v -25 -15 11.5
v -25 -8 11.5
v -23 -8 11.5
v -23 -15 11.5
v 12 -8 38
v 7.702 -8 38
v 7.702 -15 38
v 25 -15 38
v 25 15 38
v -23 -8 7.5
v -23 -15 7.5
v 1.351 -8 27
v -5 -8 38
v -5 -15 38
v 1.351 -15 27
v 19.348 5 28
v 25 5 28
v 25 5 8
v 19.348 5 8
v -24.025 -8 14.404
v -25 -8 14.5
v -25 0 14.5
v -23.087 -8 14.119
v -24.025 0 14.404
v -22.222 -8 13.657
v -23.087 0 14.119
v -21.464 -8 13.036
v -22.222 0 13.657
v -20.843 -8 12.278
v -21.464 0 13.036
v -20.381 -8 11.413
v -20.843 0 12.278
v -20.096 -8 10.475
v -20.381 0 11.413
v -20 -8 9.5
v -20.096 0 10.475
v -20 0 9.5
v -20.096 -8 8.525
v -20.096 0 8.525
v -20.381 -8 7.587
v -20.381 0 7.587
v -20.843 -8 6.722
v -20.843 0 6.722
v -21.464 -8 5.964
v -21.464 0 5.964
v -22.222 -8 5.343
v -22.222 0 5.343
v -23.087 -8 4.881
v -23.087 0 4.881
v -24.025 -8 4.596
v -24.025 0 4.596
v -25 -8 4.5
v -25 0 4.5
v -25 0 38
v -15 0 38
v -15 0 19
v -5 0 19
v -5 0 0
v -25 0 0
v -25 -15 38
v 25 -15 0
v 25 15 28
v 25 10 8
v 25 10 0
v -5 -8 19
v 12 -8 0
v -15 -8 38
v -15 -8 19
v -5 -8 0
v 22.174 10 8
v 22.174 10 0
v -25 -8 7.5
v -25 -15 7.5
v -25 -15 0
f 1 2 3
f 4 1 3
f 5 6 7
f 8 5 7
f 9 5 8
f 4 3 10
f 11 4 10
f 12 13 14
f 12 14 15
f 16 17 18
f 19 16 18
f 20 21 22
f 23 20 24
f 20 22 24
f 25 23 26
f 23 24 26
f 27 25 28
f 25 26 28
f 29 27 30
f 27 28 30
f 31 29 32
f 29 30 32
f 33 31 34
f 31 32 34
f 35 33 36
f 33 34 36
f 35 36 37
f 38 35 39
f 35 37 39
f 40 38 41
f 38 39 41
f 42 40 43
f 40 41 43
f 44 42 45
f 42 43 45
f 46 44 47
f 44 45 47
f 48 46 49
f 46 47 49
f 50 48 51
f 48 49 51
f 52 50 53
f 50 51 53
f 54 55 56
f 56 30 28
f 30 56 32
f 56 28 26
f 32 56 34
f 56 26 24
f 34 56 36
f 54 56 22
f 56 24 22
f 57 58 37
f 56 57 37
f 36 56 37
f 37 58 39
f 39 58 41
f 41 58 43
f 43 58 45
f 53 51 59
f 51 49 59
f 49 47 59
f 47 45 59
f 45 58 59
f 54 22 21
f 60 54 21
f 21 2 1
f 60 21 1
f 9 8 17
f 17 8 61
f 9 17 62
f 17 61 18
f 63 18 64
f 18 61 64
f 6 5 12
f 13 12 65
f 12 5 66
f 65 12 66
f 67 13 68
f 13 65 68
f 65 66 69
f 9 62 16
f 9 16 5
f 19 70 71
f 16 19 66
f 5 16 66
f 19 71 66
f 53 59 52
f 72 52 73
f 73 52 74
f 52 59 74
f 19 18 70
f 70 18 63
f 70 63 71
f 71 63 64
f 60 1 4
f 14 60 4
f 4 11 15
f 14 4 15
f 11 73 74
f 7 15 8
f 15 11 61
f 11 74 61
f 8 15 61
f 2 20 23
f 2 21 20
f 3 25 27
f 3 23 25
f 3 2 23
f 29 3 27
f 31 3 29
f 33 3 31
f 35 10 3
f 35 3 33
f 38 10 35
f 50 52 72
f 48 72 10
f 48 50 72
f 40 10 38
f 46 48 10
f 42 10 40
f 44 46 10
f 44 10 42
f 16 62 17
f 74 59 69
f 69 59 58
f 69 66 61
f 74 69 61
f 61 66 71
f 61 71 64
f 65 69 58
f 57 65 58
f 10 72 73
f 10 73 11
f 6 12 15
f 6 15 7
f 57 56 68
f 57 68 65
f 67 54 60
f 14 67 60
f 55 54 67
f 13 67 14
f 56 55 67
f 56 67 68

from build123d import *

# Parameters (mm, degrees)
EXTRUDE_1_DEPTH     = 38
SKETCH_2_R          = 5
SKETCH_2_W          = 10
SKETCH_2_H          = 19
CUT_EXTRUDE_1_DEPTH = 8
SKETCH_3_W          = 4
SKETCH_3_H          = 4
CUT_EXTRUDE_2_DEPTH = 51.970579749
CUT_EXTRUDE_3_DEPTH = 65.567793829


with BuildPart() as part:
    # Эскиз1 → Бобышка-Вытянуть1 (new body)
    with BuildSketch(Plane.XY):
        Polygon((-5, 0), (-25, 0), (-25, -15), (25, -15), (25, 15), (12, -8), (-5, -8), align=None)
    extrude(amount=EXTRUDE_1_DEPTH)

    # Эскиз2 → Вырез-Вытянуть1 (cut)
    with BuildSketch(Plane(origin=(0, 0, 0), x_dir=(1, 0, 0), z_dir=(0, 1, 0))):
        with Locations((-25, -9.5)):
            Circle(SKETCH_2_R)
        with Locations((-10, -28.5)):
            Rectangle(SKETCH_2_W, SKETCH_2_H)
    extrude(amount=-CUT_EXTRUDE_1_DEPTH, mode=Mode.SUBTRACT)

    # Эскиз3 → Вырез-Вытянуть2 (cut, through all)
    with BuildSketch(Plane(origin=(0, -8, 0), x_dir=(1, 0, 0), z_dir=(0, 1, 0))):
        with Locations((-25, -9.5)):
            Rectangle(SKETCH_3_W, SKETCH_3_H)
        Polygon((1.350852961, -27), (7.701705922, -38), (-5, -38), align=None)
    extrude(amount=-CUT_EXTRUDE_2_DEPTH, mode=Mode.SUBTRACT)

    # Эскиз4 → Вырез-Вытянуть3 (cut, through all)
    with BuildSketch(Plane(origin=(25, 0, 0), x_dir=(0, 0, -1), z_dir=(1, 0, 0))):
        Polygon((-8, 15), (-28, 15), (-28, 5), (-8, 5), (-8, 10), (0, 10), (0, 15), align=None)
    extrude(amount=-CUT_EXTRUDE_3_DEPTH, mode=Mode.SUBTRACT)


solid = part.part
